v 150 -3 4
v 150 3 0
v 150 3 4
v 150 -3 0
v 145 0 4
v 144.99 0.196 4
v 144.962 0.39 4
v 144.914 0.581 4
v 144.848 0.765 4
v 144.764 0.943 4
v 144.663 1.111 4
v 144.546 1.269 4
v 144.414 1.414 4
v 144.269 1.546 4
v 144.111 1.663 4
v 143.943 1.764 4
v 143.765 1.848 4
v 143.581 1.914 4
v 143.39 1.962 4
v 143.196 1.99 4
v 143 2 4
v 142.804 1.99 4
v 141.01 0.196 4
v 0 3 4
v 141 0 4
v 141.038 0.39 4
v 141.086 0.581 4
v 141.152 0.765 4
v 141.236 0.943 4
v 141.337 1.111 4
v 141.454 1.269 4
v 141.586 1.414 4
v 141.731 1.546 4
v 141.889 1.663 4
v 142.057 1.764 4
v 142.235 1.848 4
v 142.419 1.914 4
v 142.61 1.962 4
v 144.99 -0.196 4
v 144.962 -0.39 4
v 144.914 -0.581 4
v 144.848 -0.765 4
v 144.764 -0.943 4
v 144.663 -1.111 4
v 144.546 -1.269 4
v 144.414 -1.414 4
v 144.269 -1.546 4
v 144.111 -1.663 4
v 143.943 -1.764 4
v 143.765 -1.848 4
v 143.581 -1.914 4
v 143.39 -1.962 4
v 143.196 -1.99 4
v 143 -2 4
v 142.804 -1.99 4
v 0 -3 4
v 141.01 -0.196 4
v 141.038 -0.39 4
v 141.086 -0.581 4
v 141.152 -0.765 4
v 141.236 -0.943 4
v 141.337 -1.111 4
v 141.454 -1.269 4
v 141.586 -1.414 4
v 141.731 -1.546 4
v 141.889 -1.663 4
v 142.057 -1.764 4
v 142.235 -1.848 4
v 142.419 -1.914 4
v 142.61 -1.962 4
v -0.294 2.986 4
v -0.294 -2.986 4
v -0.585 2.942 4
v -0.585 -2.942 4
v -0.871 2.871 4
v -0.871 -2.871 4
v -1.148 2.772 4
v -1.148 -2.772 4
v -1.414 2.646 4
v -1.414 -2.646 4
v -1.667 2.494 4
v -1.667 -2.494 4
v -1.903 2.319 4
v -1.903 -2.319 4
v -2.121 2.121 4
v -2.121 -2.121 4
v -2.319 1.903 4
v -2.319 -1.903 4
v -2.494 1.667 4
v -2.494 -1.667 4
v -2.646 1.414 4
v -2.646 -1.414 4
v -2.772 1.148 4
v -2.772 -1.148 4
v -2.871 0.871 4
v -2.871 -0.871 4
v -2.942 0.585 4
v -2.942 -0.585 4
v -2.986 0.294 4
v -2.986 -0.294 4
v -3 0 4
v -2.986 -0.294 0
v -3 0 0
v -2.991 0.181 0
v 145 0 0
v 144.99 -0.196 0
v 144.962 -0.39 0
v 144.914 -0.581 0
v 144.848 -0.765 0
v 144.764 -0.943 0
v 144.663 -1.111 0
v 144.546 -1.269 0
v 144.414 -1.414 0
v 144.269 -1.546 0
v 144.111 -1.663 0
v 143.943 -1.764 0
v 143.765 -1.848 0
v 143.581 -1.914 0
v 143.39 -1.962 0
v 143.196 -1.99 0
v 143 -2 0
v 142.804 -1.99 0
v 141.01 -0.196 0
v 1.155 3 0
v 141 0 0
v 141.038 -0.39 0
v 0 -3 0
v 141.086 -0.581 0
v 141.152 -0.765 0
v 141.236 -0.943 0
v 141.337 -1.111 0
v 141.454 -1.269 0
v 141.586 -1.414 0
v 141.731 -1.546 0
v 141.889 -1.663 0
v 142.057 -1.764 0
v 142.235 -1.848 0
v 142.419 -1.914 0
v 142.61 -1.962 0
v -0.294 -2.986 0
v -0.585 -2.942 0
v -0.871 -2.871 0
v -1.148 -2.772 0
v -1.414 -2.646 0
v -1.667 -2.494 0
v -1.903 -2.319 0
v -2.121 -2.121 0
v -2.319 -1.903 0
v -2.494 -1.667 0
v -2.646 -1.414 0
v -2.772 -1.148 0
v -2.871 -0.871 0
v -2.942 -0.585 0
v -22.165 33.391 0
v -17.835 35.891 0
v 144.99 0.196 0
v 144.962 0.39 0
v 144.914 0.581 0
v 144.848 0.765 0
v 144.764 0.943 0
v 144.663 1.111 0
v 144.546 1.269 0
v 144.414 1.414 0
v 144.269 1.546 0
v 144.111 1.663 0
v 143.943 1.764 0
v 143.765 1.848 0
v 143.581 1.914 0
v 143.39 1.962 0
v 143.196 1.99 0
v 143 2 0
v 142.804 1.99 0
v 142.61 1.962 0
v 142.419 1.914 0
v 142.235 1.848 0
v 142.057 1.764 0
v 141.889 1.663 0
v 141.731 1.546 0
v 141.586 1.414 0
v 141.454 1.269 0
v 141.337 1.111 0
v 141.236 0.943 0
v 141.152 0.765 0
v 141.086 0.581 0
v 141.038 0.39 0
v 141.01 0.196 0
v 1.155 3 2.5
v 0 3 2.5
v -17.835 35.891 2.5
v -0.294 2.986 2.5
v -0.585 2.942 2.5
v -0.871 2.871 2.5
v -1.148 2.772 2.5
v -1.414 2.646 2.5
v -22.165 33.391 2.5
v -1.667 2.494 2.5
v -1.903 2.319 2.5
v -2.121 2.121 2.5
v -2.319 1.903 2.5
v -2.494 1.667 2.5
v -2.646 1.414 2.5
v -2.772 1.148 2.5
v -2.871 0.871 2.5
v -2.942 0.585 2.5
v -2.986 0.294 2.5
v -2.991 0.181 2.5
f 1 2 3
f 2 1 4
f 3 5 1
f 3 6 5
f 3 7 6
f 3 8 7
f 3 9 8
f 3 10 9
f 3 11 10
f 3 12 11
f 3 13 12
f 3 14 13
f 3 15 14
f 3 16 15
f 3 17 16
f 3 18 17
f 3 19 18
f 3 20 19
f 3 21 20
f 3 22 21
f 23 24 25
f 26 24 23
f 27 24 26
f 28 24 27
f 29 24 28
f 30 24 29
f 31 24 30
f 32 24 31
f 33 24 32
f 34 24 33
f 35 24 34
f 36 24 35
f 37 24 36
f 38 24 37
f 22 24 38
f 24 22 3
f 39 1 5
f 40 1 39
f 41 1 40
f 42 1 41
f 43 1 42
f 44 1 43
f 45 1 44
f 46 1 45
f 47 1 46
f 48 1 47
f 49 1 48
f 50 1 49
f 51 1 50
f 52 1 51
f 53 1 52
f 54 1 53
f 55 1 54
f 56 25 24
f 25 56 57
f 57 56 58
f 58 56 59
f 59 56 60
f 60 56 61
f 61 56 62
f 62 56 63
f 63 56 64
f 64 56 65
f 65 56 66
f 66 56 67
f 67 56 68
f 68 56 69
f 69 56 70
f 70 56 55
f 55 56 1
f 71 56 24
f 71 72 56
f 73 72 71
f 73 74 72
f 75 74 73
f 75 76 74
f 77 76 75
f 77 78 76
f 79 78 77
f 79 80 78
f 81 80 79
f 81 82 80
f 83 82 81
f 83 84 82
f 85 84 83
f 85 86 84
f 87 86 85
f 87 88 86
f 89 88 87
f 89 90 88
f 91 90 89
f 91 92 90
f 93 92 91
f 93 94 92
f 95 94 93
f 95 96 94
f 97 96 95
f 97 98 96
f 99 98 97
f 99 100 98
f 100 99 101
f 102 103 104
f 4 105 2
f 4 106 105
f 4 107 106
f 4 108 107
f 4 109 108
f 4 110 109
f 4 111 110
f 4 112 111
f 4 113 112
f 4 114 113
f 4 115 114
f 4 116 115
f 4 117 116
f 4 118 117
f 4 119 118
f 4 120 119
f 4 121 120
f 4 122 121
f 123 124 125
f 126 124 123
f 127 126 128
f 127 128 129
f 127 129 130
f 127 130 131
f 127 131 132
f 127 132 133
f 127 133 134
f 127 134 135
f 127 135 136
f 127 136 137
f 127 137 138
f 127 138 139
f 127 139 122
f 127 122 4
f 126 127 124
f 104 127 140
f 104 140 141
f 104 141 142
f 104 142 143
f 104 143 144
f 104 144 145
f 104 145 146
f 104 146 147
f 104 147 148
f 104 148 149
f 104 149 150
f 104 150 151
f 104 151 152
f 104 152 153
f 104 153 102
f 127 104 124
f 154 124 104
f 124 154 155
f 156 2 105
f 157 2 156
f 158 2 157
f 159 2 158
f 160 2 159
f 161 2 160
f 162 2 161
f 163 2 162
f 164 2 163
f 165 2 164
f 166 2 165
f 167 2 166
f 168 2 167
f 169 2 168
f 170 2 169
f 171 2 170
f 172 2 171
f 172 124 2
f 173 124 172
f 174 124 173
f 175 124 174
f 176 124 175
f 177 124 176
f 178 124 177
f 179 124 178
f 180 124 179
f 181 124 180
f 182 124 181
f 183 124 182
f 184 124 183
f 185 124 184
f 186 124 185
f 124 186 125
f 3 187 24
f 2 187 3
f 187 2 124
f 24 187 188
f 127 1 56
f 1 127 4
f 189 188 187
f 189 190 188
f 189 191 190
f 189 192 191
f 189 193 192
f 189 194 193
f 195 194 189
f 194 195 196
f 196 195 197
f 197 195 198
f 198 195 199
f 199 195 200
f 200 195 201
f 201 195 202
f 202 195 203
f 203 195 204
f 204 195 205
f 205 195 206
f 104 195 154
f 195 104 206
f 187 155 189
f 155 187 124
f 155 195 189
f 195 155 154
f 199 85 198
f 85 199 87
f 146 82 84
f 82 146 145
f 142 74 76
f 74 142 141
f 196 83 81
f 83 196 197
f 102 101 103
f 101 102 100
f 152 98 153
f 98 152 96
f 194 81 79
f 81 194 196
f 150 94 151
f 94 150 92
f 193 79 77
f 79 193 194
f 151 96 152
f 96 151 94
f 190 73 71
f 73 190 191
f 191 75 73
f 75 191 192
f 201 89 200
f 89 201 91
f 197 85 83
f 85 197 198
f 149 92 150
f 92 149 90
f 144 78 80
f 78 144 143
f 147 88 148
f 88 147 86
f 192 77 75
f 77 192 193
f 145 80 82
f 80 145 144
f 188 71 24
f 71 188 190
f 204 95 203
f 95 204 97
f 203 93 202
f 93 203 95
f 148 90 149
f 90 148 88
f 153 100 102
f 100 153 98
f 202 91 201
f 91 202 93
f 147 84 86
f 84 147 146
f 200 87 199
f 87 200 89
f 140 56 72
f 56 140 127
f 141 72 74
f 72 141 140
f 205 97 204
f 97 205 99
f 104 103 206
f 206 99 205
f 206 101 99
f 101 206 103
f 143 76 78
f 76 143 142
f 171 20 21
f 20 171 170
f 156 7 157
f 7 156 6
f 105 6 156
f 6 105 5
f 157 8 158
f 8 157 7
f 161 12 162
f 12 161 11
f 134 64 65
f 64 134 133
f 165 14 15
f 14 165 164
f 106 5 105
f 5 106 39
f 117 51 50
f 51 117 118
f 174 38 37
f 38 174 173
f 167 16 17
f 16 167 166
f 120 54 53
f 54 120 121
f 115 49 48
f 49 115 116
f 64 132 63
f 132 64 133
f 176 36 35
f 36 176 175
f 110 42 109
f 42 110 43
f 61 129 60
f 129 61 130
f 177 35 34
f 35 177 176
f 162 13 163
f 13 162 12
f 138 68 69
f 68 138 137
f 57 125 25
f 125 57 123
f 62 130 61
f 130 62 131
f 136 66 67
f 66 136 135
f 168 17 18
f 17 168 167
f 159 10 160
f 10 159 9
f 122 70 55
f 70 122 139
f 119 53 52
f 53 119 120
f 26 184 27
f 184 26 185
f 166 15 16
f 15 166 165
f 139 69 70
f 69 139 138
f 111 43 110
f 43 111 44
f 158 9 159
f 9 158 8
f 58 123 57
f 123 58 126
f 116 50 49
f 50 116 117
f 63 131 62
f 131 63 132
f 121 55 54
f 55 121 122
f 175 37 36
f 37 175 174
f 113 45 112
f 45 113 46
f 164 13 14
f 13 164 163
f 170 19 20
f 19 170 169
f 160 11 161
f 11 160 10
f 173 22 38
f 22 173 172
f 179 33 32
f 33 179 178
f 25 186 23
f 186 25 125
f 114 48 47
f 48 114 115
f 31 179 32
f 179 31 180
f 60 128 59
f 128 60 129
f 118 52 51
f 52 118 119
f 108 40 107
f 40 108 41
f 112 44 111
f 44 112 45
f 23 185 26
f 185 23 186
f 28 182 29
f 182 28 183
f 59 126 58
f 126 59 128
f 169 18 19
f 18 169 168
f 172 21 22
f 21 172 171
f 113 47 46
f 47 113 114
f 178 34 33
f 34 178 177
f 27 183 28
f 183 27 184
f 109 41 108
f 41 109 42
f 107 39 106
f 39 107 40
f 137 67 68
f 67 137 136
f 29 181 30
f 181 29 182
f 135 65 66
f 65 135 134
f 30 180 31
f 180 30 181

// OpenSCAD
// L-shaped (hockey-stick) cell spreader, printed lying flat on XY plane
$fn = 64;

// Handle
handle_len   = 150;  // handle length along +X (mm)
handle_w     = 6;    // handle width in Y (mm)
handle_t     = 4;    // handle thickness in Z (mm)

// Spreading foot
foot_len     = 40;   // foot length along its centre line (mm)
foot_w       = 5;    // foot width (mm)
foot_t       = 2.5;  // foot thickness in Z (mm), bed side spreads agar
foot_angle   = 120;  // foot direction, degrees CCW from +X (mm/deg)

// Joint boss
boss_d       = 6;    // boss diameter (mm)
boss_h       = 4;    // boss height (mm)

// Hanging hole
hole_d       = 4;    // hanging hole diameter (mm)
hole_x       = 143;  // hanging hole centre X (mm)
hole_y       = 0;    // hanging hole centre Y (mm)

eps          = 0.5;  // cutter overshoot (mm)

difference() {
    union() {
        // Handle bar: x 0..150, y -3..3, z 0..4
        translate([0, -handle_w/2, 0])
            cube([handle_len, handle_w, handle_t]);

        // Spreading foot: starts at origin, points 120 deg CCW from +X
        rotate([0, 0, foot_angle])
            translate([0, -foot_w/2, 0])
                cube([foot_len, foot_w, foot_t]);

        // Round joining boss at origin
        cylinder(d = boss_d, h = boss_h);
    }

    // Hanging hole through handle
    translate([hole_x, hole_y, -eps])
        cylinder(d = hole_d, h = handle_t + 2*eps);
}
